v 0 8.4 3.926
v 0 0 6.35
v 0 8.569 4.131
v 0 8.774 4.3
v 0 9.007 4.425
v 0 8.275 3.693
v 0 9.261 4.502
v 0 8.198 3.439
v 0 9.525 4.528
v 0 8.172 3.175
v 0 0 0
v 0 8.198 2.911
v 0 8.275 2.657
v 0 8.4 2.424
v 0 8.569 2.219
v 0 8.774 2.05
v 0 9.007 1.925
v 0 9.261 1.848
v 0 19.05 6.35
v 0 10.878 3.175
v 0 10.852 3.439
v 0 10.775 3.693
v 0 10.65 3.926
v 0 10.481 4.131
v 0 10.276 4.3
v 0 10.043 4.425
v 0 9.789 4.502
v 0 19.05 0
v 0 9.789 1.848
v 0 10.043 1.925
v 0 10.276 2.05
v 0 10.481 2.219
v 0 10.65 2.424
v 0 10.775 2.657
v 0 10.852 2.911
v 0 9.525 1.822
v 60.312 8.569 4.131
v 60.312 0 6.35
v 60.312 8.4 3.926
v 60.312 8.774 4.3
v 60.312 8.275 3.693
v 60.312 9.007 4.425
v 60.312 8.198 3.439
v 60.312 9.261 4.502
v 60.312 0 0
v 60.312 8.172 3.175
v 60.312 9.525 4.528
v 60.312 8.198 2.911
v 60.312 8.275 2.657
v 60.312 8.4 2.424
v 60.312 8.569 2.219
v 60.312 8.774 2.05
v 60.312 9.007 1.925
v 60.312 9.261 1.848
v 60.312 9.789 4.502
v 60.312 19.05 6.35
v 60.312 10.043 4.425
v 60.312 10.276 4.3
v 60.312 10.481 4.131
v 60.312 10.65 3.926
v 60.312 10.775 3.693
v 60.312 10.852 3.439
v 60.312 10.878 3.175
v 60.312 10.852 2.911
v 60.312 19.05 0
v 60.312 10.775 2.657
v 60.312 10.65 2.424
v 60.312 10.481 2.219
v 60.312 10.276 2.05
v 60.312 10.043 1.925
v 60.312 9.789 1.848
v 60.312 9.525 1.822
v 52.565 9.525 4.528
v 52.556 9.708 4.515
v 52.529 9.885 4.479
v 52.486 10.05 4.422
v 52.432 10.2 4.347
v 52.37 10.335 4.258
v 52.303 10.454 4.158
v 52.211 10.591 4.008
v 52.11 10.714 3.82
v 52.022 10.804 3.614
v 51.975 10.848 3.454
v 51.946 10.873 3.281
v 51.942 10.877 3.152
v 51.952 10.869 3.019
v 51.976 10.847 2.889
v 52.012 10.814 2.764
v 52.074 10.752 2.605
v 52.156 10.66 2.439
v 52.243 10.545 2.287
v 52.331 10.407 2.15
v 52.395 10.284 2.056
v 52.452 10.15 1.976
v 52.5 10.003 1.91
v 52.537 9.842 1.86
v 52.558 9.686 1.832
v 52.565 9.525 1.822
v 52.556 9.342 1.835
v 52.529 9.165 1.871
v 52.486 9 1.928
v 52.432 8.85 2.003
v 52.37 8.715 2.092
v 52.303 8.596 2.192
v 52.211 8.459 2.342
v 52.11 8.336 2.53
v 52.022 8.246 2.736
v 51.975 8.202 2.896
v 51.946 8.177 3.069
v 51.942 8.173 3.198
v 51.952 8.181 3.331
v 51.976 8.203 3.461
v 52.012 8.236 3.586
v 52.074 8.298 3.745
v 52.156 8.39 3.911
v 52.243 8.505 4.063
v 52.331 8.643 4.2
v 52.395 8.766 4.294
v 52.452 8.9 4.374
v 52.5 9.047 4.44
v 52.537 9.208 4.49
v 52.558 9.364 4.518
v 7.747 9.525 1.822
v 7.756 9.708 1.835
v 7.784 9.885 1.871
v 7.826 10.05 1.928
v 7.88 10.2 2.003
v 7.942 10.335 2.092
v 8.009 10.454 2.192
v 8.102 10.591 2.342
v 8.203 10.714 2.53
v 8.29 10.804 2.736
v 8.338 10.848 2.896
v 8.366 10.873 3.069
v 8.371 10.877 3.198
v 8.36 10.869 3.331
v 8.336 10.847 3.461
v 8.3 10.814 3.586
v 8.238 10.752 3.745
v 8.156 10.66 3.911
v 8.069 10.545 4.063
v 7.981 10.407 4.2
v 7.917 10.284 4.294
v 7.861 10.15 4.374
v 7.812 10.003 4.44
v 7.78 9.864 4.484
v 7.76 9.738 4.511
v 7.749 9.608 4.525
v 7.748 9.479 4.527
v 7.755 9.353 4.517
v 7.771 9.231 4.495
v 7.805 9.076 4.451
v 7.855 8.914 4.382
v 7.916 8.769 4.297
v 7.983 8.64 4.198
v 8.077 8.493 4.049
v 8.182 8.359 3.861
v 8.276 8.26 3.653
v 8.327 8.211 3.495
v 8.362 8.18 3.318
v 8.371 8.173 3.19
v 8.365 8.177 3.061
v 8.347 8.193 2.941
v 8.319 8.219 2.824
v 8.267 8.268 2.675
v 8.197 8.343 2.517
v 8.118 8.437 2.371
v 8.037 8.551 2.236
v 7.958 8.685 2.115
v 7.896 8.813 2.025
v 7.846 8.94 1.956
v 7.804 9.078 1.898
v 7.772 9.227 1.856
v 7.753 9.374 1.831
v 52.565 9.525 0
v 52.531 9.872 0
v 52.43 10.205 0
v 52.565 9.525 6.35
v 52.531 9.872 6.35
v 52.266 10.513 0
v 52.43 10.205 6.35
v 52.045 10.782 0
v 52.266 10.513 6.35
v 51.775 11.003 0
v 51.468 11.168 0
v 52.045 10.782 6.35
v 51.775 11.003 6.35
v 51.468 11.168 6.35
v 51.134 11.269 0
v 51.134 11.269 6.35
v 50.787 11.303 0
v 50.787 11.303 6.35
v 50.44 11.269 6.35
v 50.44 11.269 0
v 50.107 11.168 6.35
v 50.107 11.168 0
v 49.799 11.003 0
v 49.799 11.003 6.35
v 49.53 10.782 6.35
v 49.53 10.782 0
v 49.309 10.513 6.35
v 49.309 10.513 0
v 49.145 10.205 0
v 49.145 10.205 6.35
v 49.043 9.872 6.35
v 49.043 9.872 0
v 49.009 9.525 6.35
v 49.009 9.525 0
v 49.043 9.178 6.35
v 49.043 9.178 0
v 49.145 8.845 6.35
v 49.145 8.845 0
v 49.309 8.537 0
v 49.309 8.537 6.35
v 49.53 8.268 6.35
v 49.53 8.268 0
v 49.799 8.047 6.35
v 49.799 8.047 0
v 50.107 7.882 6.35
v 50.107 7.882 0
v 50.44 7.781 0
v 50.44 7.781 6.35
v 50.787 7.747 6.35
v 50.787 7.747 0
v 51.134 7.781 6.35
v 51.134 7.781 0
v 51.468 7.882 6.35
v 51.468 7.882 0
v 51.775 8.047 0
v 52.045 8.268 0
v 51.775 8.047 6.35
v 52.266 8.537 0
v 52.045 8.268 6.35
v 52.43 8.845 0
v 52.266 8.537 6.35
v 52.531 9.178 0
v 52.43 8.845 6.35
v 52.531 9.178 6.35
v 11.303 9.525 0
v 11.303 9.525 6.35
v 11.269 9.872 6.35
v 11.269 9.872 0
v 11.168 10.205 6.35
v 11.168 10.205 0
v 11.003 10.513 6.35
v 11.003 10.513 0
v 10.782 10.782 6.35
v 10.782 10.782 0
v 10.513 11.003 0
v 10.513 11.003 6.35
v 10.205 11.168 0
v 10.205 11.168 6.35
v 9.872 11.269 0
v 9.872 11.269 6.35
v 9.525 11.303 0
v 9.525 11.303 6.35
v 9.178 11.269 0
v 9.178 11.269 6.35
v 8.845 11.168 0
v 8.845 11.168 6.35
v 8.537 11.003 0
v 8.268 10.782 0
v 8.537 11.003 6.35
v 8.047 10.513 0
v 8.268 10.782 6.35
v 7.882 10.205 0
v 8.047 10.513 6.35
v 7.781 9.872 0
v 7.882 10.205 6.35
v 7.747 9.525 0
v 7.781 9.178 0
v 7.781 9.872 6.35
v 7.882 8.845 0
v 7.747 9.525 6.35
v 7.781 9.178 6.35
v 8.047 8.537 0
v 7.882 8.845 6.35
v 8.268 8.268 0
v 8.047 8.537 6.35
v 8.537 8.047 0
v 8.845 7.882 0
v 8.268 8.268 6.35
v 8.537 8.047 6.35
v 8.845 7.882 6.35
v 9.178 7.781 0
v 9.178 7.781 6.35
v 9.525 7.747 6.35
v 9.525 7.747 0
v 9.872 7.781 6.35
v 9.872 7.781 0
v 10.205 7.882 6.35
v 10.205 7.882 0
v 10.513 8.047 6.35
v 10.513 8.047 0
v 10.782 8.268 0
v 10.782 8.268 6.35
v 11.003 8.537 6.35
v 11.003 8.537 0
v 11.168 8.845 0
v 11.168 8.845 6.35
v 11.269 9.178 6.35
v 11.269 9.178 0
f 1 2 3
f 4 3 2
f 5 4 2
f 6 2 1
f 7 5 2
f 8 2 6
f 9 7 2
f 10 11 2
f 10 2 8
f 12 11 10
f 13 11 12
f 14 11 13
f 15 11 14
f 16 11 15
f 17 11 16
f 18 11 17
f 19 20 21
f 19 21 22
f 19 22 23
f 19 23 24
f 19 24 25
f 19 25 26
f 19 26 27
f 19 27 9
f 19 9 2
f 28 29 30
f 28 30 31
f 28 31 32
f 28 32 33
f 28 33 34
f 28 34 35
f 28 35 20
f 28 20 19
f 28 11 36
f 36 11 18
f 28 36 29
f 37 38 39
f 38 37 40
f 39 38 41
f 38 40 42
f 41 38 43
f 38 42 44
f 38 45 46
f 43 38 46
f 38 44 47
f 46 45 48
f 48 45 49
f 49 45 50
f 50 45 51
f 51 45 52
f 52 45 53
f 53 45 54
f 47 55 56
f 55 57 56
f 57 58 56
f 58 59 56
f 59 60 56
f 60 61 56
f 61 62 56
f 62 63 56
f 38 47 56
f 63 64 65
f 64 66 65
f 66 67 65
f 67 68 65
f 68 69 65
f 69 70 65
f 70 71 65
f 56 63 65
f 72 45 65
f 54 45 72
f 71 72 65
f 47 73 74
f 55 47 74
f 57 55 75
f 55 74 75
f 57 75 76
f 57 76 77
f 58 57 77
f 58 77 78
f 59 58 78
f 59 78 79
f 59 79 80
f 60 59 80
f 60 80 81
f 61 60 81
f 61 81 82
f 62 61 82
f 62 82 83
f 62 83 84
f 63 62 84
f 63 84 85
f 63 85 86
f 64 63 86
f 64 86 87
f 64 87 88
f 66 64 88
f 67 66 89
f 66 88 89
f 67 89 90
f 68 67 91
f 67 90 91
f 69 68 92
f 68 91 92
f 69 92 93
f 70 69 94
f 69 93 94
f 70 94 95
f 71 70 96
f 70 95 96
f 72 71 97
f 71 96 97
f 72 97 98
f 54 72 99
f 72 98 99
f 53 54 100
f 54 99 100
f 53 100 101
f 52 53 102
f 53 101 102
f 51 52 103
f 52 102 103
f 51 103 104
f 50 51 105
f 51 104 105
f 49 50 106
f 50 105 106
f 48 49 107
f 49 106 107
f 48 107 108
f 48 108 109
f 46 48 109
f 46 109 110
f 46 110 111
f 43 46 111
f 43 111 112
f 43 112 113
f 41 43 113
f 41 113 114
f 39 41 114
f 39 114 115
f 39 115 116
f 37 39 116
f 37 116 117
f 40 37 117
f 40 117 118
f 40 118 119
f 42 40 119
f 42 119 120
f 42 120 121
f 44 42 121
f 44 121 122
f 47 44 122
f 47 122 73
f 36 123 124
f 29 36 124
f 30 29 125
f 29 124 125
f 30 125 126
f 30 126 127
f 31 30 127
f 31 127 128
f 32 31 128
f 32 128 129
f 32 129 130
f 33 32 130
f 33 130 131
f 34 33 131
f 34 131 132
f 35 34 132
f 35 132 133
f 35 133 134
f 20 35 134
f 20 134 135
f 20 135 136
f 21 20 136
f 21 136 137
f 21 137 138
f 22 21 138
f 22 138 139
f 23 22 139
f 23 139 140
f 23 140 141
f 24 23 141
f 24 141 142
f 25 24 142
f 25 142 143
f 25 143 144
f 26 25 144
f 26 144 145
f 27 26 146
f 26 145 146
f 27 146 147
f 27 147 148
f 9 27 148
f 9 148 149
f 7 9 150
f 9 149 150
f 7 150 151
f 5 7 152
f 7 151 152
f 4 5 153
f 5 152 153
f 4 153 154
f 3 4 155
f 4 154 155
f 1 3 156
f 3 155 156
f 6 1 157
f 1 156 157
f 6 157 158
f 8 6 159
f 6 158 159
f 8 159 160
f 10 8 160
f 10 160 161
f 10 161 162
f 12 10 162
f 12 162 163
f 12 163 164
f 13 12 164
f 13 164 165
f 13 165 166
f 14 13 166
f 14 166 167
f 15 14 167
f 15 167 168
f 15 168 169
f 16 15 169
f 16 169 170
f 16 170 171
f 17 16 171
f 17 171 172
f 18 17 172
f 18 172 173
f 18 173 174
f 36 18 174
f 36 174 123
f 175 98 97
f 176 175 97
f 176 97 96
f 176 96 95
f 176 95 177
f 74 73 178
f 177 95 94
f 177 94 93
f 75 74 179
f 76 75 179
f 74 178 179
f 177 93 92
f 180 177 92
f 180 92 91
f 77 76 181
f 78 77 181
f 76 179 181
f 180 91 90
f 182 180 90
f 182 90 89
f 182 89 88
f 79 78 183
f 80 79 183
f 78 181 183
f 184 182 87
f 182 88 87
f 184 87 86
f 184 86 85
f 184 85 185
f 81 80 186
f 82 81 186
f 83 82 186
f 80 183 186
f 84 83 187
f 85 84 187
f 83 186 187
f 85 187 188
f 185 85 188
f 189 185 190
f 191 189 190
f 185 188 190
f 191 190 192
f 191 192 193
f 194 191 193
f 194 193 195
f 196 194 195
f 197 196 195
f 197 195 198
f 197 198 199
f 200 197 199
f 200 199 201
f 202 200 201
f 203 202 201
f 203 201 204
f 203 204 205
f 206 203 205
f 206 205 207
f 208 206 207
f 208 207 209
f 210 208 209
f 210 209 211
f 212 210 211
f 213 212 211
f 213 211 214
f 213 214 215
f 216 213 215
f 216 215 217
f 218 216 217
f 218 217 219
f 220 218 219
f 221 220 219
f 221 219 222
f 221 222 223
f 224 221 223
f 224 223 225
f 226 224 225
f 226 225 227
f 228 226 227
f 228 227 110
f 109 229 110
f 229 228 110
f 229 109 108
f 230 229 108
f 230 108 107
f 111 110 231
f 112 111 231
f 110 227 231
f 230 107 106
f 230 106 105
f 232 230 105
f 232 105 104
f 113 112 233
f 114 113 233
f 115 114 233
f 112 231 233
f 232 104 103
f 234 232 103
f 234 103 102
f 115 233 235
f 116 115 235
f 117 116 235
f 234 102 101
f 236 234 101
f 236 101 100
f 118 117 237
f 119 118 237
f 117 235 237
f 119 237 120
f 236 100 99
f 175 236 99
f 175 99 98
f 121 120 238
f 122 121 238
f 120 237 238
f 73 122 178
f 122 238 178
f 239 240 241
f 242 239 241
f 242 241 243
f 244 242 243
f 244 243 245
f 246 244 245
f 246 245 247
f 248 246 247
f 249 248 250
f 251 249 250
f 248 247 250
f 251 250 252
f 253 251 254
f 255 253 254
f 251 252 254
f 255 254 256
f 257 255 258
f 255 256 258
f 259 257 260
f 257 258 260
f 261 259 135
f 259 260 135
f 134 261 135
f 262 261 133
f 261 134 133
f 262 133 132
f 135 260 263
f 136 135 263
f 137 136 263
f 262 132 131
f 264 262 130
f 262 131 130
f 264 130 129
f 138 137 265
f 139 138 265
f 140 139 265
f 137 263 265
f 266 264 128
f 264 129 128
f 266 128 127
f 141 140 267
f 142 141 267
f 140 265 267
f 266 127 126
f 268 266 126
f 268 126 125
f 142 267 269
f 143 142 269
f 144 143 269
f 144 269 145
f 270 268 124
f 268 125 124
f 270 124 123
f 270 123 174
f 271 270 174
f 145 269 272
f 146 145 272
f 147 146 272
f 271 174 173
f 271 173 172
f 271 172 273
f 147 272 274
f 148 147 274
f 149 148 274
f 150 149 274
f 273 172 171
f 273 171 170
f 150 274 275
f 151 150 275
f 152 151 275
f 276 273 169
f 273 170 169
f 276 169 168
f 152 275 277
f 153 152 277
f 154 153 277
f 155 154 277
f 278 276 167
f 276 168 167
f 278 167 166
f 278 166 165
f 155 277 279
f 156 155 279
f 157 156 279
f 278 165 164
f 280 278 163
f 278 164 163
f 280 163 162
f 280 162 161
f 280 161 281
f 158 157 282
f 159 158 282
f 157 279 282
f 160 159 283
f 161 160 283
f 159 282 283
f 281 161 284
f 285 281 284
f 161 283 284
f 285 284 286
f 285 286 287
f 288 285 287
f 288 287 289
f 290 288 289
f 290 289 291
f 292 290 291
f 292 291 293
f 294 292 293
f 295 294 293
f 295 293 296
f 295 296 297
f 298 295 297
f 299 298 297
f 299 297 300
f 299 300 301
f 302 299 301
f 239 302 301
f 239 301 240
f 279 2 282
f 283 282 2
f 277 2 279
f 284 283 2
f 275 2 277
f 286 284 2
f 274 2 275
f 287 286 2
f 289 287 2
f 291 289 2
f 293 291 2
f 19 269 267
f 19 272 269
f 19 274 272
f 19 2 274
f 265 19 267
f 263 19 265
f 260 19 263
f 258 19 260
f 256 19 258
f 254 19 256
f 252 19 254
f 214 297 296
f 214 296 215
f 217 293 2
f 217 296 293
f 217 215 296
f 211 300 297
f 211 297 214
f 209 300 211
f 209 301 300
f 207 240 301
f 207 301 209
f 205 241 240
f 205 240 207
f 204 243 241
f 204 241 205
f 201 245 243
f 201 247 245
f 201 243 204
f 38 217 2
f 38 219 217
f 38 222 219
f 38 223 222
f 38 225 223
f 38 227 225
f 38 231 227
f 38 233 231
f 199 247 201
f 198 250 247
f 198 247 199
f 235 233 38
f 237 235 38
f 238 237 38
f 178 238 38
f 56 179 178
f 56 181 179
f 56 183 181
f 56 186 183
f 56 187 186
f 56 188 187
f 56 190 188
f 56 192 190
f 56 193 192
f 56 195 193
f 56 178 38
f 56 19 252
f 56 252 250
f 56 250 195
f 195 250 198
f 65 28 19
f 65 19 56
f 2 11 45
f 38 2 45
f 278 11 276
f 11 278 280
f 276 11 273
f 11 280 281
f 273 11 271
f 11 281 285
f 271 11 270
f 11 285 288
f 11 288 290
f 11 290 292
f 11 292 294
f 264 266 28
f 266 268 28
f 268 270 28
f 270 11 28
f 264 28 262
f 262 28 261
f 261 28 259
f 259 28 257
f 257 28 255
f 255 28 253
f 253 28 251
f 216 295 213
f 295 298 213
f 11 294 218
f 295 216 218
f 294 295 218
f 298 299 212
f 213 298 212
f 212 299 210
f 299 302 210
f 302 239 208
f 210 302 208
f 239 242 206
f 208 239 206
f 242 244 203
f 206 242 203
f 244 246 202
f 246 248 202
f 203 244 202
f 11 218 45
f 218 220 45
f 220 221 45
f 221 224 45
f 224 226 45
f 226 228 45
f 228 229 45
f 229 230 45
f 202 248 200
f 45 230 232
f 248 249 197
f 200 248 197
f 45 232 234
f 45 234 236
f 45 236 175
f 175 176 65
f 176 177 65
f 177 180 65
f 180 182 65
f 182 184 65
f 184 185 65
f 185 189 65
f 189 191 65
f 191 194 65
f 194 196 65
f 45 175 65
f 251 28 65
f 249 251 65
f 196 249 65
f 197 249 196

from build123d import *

# Parameters (mm, degrees)
SKETCH1_W                 = 60.3123
SKETCH1_H                 = 19.05
EXTRUDE1_DEPTH            = 6.35
SKETCH2_R                 = 1.778
CUT_EXTRUDE1_DEPTH        = 7.35
F_6_32_TAPPED_HOLE1_D     = 2.7051
F_6_32_TAPPED_HOLE1_DEPTH = 9.525
F_6_32_TAPPED_HOLE1_TIP   = 0.81269403
F_6_32_TAPPED_HOLE2_D     = 2.7051
F_6_32_TAPPED_HOLE2_DEPTH = 9.525
F_6_32_TAPPED_HOLE2_TIP   = 0.81269403


with BuildPart() as part:
    # Sketch1 → Extrude1 (new body)
    with BuildSketch(Plane.XY):
        with Locations((30.15615, 9.525)):
            Rectangle(SKETCH1_W, SKETCH1_H)
    extrude(amount=EXTRUDE1_DEPTH)

    # Sketch2 → Cut-Extrude1 (cut, through all)
    with BuildSketch(Plane.XY.offset(6.35)):
        with Locations((9.525, 9.525)):
            Circle(SKETCH2_R)
        with Locations((50.7873, 9.525)):
            Circle(SKETCH2_R)
    extrude(amount=-CUT_EXTRUDE1_DEPTH, mode=Mode.SUBTRACT)

    # #6-32 Tapped Hole1
    with Locations(Plane.ZY):
        with Locations((3.175, 9.525)):
            Hole(F_6_32_TAPPED_HOLE1_D / 2, depth=F_6_32_TAPPED_HOLE1_DEPTH)
            with Locations((0, 0, -(F_6_32_TAPPED_HOLE1_DEPTH + F_6_32_TAPPED_HOLE1_TIP / 2))):  # 118° drill point
                Cone(0, F_6_32_TAPPED_HOLE1_D / 2, F_6_32_TAPPED_HOLE1_TIP, mode=Mode.SUBTRACT)

    # #6-32 Tapped Hole2
    with Locations(Plane(origin=(60.3123, 0, 0), x_dir=(0, 0, -1), z_dir=(1, 0, 0))):
        with Locations((-3.175, 9.525)):
            Hole(F_6_32_TAPPED_HOLE2_D / 2, depth=F_6_32_TAPPED_HOLE2_DEPTH)
            with Locations((0, 0, -(F_6_32_TAPPED_HOLE2_DEPTH + F_6_32_TAPPED_HOLE2_TIP / 2))):  # 118° drill point
                Cone(0, F_6_32_TAPPED_HOLE2_D / 2, F_6_32_TAPPED_HOLE2_TIP, mode=Mode.SUBTRACT)


solid = part.part
